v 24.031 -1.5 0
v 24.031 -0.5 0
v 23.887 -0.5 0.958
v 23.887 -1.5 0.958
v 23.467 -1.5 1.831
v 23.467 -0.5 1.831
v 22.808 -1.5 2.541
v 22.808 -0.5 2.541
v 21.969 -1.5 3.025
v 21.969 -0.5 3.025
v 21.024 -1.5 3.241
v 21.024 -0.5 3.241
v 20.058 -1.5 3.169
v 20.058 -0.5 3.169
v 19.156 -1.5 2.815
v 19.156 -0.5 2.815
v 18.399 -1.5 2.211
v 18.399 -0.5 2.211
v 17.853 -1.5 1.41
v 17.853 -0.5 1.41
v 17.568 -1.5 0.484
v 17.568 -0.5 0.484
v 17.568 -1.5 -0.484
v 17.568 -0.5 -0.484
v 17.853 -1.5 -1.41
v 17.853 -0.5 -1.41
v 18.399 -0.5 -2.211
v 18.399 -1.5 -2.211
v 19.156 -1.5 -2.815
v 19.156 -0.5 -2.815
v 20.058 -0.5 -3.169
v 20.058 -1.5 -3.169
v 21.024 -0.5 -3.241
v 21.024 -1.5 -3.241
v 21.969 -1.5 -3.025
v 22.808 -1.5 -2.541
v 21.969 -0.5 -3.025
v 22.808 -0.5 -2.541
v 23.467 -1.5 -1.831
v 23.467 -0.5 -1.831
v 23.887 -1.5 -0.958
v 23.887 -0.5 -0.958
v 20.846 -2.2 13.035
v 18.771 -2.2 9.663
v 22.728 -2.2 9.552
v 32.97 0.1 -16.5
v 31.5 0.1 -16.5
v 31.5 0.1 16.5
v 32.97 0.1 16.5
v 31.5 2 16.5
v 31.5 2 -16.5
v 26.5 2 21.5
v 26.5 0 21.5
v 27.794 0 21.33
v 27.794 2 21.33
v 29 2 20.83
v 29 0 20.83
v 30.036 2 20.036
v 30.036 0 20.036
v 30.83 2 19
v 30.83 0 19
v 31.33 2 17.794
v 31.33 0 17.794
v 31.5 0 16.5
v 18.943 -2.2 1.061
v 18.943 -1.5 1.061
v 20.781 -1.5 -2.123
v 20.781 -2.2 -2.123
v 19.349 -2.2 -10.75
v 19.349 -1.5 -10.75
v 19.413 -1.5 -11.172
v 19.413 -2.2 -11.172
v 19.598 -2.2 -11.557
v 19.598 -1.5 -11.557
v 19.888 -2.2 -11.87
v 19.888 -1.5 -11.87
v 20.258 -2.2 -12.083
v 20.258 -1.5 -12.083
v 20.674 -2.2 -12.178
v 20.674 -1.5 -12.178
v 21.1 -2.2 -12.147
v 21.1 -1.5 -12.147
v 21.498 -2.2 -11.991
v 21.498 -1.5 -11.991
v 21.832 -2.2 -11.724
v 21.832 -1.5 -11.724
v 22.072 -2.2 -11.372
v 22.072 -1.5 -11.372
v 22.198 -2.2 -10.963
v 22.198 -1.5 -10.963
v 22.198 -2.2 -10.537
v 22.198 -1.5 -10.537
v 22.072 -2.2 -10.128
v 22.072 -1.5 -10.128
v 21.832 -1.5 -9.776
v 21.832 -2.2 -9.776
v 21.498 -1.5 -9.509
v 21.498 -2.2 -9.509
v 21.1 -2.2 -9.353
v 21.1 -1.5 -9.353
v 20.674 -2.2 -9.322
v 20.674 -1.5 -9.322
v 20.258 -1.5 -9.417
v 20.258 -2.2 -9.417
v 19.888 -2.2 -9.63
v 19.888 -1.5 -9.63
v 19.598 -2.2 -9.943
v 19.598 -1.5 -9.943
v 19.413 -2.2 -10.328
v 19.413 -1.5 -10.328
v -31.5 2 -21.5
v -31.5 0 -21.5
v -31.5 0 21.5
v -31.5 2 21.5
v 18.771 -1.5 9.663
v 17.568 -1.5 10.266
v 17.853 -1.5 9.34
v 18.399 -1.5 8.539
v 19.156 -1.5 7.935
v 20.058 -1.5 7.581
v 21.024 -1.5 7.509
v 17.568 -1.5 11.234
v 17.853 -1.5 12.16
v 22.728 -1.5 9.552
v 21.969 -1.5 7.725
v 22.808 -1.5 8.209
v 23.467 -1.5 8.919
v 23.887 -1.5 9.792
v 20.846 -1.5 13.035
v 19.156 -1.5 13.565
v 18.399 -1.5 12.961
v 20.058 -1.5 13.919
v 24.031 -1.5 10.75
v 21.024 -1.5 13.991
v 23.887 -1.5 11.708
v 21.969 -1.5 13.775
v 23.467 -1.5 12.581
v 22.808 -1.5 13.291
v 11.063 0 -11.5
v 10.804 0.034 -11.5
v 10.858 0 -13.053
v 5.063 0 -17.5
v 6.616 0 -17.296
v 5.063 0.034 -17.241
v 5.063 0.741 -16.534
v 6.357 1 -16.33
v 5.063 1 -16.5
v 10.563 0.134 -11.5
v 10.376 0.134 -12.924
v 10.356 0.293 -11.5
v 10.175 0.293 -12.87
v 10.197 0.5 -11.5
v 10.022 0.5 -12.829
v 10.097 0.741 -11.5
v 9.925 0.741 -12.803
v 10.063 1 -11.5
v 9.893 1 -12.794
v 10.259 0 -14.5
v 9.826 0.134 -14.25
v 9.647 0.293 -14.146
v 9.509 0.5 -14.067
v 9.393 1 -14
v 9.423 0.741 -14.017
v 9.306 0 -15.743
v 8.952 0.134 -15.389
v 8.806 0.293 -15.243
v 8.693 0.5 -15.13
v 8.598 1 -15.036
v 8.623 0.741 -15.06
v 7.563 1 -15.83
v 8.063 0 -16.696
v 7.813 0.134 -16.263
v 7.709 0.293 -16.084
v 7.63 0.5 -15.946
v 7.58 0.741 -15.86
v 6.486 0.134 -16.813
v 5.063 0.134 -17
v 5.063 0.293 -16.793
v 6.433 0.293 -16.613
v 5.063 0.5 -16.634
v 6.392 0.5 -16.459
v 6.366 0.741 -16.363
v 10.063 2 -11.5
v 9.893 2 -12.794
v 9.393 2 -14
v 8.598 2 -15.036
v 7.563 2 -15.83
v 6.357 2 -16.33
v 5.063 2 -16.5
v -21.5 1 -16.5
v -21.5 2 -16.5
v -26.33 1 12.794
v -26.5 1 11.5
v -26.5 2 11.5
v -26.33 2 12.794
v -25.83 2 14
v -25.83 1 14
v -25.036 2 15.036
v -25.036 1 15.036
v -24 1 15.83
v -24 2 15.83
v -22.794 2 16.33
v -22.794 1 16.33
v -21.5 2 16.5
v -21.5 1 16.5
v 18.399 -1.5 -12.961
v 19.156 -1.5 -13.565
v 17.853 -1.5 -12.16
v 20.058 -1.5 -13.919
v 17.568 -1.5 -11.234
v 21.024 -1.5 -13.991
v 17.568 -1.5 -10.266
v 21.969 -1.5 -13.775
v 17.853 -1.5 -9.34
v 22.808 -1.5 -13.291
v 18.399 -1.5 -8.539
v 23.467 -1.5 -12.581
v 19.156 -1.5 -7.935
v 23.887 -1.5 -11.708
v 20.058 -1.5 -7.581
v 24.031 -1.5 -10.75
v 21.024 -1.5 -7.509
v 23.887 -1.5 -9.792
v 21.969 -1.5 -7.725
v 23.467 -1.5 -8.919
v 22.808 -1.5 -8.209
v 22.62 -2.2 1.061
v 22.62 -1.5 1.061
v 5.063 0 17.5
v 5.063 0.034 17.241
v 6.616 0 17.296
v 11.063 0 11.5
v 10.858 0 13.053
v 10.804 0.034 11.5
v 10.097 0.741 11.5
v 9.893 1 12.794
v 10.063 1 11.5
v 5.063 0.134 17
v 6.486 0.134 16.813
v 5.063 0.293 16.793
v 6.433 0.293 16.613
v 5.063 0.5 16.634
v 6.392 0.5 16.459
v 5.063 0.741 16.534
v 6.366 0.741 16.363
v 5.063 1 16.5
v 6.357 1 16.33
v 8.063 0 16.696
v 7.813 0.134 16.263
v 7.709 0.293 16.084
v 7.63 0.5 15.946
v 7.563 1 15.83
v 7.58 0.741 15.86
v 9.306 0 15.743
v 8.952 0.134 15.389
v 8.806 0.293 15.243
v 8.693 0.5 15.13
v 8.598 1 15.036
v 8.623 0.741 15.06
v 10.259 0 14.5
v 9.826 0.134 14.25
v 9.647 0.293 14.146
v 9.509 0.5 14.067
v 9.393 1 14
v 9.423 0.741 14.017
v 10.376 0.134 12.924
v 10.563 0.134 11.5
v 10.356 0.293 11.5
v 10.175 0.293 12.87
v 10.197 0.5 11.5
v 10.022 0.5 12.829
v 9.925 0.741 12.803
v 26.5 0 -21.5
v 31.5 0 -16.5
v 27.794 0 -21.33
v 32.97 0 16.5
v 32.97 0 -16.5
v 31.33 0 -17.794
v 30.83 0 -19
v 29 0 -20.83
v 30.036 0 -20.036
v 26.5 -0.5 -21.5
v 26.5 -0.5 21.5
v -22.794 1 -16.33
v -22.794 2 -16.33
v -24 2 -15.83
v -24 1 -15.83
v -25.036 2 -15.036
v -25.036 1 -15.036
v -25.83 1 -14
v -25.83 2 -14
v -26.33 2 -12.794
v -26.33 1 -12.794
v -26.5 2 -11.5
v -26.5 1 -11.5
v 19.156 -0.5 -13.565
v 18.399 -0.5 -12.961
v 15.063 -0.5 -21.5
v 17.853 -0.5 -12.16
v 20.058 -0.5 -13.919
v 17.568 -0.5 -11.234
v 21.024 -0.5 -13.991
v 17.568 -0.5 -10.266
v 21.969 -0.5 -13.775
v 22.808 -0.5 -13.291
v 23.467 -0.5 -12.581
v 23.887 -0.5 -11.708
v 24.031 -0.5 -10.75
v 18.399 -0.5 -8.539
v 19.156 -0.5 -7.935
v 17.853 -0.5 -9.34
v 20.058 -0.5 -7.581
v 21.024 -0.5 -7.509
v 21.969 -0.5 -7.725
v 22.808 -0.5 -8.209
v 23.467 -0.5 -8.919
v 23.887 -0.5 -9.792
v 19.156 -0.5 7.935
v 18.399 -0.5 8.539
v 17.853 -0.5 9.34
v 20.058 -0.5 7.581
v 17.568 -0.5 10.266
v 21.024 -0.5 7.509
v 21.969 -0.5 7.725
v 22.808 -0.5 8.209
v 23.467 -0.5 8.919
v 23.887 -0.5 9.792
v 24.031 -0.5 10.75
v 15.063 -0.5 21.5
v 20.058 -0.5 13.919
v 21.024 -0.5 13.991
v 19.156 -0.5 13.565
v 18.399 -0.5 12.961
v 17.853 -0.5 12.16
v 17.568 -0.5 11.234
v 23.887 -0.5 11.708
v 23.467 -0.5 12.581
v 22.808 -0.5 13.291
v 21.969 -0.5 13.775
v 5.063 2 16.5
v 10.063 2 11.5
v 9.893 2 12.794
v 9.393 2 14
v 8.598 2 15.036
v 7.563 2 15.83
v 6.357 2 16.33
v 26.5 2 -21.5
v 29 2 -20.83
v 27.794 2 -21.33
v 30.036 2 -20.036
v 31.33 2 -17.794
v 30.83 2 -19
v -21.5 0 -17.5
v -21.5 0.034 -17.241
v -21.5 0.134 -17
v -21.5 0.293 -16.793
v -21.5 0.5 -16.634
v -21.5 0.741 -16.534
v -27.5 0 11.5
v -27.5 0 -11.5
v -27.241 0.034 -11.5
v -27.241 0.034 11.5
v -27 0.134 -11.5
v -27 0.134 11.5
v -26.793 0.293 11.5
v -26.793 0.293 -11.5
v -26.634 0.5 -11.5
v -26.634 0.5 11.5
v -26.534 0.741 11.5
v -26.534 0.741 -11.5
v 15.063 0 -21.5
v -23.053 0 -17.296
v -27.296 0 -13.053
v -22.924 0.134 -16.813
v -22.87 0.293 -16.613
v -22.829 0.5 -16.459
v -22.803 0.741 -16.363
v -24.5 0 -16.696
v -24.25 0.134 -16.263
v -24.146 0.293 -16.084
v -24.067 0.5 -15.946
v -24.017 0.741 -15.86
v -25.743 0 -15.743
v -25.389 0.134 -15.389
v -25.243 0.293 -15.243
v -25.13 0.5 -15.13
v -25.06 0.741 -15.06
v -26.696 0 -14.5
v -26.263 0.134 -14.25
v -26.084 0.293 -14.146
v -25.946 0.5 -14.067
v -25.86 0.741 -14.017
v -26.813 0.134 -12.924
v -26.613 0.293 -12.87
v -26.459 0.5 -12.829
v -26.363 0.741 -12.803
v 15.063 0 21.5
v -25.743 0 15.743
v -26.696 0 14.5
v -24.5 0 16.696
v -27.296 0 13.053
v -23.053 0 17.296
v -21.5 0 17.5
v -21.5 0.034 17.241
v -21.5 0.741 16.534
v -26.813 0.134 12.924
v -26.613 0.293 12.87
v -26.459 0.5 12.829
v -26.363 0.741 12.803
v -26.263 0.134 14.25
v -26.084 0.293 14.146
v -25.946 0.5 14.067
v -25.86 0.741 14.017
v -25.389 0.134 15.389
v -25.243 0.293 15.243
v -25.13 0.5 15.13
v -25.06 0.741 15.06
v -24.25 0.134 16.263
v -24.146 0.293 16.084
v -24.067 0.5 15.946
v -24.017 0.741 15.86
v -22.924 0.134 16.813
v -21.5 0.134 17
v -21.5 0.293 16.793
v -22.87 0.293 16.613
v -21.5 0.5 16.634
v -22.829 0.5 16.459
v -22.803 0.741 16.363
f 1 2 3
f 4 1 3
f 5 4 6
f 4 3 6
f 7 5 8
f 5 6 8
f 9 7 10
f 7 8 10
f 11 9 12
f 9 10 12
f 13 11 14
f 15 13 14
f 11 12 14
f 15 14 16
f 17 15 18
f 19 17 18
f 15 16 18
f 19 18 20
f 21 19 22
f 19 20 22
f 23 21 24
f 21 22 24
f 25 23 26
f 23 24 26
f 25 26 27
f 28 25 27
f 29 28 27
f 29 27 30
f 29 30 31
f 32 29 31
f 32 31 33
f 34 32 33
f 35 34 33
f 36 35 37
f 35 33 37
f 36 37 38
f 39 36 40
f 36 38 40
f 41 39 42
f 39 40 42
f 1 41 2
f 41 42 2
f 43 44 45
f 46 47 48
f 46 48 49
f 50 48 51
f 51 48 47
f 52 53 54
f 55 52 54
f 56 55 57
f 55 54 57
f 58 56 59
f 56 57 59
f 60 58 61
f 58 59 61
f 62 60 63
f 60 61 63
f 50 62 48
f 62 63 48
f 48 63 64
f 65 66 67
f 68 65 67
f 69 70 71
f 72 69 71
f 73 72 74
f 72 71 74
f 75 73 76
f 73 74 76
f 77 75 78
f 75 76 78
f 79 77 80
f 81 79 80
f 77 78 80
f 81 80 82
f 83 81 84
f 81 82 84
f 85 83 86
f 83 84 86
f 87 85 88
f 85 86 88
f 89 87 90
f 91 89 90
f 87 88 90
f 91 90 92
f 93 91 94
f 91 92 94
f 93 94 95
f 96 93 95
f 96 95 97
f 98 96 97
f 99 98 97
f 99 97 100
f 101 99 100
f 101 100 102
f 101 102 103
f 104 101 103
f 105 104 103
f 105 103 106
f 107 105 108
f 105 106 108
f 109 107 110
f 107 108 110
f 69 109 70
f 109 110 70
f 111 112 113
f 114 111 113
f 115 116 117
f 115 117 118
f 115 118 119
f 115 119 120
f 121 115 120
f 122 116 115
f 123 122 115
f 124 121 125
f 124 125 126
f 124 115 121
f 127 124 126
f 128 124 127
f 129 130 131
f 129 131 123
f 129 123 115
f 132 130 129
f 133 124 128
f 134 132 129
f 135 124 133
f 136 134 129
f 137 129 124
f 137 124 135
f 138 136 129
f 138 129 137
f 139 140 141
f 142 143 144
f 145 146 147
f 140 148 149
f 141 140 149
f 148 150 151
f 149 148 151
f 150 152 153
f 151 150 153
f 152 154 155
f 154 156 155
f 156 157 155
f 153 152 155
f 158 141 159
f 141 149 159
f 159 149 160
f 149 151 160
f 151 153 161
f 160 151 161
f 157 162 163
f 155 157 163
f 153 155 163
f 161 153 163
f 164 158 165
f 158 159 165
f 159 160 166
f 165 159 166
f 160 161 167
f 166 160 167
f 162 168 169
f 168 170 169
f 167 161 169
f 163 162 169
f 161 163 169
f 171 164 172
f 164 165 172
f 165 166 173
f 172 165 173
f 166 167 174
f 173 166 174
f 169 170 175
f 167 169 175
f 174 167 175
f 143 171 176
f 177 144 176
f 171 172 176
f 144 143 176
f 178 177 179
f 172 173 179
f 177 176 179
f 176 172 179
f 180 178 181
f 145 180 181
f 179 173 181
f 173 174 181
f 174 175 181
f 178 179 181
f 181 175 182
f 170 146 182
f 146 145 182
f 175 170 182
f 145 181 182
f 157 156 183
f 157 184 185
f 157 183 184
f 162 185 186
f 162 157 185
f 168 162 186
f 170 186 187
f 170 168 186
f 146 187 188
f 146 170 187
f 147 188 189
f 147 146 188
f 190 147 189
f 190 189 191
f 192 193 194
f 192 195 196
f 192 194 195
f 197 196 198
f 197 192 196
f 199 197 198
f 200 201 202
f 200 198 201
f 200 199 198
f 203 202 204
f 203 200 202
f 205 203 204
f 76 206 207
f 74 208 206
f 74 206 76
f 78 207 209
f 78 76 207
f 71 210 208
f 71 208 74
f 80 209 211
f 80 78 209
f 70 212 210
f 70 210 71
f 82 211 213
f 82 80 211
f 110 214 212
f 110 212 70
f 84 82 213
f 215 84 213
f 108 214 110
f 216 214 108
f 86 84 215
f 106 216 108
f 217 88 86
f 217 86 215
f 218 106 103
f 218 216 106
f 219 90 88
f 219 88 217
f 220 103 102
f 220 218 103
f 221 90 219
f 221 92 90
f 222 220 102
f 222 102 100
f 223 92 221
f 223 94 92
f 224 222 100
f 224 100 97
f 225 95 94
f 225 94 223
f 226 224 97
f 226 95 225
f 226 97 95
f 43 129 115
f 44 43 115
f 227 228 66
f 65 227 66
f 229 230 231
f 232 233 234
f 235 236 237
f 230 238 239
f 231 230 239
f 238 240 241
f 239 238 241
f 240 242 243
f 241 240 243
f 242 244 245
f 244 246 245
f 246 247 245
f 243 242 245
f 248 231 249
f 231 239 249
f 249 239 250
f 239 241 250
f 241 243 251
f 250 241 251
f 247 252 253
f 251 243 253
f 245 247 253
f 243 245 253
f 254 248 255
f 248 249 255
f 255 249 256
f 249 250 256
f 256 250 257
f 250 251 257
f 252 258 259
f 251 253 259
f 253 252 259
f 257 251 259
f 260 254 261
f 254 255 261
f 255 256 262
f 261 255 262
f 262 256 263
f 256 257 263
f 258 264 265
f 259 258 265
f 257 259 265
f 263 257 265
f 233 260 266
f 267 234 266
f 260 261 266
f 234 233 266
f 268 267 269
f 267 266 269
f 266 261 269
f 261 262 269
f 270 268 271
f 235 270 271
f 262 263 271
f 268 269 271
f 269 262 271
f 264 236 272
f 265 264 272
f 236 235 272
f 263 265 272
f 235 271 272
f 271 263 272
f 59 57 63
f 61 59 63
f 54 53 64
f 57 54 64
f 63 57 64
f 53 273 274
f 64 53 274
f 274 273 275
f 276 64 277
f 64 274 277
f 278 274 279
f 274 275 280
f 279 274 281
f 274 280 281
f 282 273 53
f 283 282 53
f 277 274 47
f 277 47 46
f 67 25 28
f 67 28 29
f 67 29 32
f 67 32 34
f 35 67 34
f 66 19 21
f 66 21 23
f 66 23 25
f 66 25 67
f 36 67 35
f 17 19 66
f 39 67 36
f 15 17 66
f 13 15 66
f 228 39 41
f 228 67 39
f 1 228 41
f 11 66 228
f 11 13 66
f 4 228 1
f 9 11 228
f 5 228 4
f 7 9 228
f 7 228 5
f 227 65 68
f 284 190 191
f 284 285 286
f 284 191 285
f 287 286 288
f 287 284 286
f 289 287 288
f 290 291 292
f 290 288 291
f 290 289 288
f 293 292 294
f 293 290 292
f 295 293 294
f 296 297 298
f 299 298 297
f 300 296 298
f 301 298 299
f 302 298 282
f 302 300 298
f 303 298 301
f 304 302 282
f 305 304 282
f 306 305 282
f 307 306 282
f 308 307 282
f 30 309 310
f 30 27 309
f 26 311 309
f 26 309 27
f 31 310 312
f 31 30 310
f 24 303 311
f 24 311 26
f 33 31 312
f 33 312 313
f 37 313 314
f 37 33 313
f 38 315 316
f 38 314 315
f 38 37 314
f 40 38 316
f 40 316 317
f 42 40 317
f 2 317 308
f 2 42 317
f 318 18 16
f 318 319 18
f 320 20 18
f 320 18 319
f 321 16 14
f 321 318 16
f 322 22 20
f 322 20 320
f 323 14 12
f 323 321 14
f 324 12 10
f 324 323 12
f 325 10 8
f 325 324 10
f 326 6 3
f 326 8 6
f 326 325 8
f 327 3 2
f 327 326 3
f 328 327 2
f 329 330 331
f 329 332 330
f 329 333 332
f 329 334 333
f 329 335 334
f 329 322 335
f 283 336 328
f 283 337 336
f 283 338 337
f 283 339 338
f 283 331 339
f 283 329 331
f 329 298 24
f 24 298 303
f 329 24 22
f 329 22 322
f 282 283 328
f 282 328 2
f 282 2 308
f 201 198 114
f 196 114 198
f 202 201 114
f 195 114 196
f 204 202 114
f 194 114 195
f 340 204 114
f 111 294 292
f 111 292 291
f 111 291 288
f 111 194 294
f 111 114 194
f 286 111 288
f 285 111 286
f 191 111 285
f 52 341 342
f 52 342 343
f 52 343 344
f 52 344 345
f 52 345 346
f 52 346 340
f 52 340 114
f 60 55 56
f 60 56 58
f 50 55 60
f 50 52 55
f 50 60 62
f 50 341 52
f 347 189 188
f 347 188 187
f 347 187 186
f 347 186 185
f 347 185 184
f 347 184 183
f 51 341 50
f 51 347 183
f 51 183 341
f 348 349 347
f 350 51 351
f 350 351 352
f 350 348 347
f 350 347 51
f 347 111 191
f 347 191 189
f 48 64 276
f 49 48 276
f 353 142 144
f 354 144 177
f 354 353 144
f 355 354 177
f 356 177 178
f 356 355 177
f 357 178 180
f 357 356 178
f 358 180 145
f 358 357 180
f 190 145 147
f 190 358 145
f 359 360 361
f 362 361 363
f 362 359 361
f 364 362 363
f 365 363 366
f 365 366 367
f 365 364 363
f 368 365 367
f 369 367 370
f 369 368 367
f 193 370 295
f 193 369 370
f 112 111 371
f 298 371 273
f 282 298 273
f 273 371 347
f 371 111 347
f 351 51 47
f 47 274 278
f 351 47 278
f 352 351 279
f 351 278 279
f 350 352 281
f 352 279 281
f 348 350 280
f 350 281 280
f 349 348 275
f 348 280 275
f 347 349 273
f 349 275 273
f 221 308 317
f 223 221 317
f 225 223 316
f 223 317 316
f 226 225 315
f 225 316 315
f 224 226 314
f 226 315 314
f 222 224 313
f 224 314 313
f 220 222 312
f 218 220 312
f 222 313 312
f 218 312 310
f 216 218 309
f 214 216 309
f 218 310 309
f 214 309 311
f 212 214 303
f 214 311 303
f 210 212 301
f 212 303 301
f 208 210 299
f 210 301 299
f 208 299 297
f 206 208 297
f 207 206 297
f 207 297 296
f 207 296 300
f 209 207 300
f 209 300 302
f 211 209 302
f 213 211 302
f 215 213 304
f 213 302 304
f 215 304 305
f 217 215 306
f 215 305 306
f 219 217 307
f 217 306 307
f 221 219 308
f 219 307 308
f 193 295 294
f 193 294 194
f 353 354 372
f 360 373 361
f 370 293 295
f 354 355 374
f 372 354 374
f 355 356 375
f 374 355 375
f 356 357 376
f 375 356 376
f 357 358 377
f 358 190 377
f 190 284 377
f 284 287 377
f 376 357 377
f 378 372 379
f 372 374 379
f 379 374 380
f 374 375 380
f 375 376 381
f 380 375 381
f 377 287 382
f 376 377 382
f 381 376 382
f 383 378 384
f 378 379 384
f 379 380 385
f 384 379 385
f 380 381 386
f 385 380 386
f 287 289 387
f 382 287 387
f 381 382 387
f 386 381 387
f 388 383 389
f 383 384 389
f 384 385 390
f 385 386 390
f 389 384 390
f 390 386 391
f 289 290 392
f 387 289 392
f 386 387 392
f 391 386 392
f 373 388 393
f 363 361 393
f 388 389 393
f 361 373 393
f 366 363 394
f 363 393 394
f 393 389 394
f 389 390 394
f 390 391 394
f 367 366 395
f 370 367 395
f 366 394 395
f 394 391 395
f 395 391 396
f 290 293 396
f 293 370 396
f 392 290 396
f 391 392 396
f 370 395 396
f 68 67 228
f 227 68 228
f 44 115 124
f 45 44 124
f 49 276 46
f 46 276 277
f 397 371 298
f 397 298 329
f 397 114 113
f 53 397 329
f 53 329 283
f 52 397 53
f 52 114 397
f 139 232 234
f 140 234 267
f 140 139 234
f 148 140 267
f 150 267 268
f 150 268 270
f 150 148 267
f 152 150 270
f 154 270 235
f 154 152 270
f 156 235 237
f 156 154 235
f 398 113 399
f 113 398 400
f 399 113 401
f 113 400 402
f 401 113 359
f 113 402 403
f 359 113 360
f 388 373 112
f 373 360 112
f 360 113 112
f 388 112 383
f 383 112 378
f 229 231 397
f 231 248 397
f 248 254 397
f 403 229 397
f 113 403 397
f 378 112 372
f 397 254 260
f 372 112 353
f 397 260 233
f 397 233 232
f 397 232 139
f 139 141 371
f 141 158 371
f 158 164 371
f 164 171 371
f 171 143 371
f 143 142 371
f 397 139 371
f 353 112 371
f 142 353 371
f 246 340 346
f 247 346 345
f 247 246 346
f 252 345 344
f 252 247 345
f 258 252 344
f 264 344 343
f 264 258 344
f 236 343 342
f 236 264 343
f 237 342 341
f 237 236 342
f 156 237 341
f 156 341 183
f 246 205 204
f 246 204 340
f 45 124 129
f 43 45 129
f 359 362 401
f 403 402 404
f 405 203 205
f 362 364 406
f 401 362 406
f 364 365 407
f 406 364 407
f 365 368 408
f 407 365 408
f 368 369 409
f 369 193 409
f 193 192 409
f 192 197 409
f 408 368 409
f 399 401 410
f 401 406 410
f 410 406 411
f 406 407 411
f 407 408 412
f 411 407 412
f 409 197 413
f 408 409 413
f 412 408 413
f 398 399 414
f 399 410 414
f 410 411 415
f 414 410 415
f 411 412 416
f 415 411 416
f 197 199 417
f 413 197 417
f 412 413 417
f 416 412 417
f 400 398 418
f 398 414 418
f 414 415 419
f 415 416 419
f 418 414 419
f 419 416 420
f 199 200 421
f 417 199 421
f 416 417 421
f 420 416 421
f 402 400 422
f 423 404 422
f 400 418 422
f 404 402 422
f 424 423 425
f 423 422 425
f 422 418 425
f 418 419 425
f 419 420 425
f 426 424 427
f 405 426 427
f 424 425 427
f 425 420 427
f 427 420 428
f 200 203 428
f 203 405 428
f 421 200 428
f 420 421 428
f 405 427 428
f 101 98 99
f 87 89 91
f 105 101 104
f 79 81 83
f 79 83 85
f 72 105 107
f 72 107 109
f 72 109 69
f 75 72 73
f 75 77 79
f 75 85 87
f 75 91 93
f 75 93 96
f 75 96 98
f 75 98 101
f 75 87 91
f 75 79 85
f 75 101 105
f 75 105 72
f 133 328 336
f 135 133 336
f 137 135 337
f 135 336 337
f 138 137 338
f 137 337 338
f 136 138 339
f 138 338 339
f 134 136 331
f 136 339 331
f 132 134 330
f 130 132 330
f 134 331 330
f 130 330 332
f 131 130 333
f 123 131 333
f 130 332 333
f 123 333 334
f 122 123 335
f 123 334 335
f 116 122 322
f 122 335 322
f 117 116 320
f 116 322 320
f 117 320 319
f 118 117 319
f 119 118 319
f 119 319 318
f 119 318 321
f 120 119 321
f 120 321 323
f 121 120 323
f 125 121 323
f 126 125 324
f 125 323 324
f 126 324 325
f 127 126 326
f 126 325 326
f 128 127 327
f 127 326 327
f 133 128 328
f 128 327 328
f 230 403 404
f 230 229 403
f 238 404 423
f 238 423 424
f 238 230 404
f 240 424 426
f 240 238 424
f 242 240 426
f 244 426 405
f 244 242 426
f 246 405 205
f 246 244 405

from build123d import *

# Parameters (mm, degrees)
BOSS_EXTRUDE1_DEPTH = 2
SKETCH3_W           = 1.47
SKETCH3_H           = 33
BOSS_EXTRUDE3_DEPTH = 0.1
SKETCH4_W           = 11.437084048
SKETCH4_H           = 43
BOSS_EXTRUDE4_DEPTH = 0.5
SKETCH5_R           = 3.25
BOSS_EXTRUDE5_DEPTH = 1
BOSS_EXTRUDE6_DEPTH = 0.7
CUT_EXTRUDE2_DEPTH  = 10
FILLET4_R           = 1
SKETCH7_R           = 1.432474787
BOSS_EXTRUDE7_DEPTH = 0.7


with BuildPart() as part:
    # Sketch1 → Boss-Extrude1 (new body)
    with BuildSketch(Plane(origin=(0, 0, 0), x_dir=(1, 0, 0), z_dir=(0, 1, 0))):
        with BuildLine():
            Line((-26.5, 21.5), (-31.5, 21.5))
            Line((-31.5, 21.5), (-31.5, 16.5))
            Line((-31.5, 16.5), (-31.5, -16.5))
            Line((-31.5, -16.5), (-31.5, -21.5))
            Line((-31.5, -21.5), (-26.5, -21.5))
            Line((-26.5, -21.5), (26.5, -21.5))
            ThreePointArc((26.5, -21.5), (30.035533906, -20.035533906), (31.5, -16.5))
            Line((31.5, -16.5), (31.5, 16.5))
            ThreePointArc((31.5, 16.5), (30.035533906, 20.035533906), (26.5, 21.5))
            Line((26.5, 21.5), (-26.5, 21.5))
        make_face()
    extrude(amount=BOSS_EXTRUDE1_DEPTH)

    # Sketch3 → Boss-Extrude3 (add)
    with BuildSketch(Plane(origin=(0, 0, 0), x_dir=(1, 0, 0), z_dir=(0, 1, 0))):
        with Locations((32.235, 0)):
            Rectangle(SKETCH3_W, SKETCH3_H)
    extrude(amount=BOSS_EXTRUDE3_DEPTH)

    # Sketch4 → Boss-Extrude4 (add)
    with BuildSketch(Plane.XZ):
        with Locations((20.781457976, 0)):
            Rectangle(SKETCH4_W, SKETCH4_H)
    extrude(amount=BOSS_EXTRUDE4_DEPTH)

    # Sketch5 → Boss-Extrude5 (add)
    with BuildSketch(Plane.XZ.offset(0.5)):
        with Locations((20.781457976, -10.75)):
            Circle(SKETCH5_R)
        with Locations((20.781457976, 0)):
            Circle(SKETCH5_R)
        with Locations((20.781457976, 10.75)):
            Circle(SKETCH5_R)
    extrude(amount=BOSS_EXTRUDE5_DEPTH)

    # Sketch6 → Boss-Extrude6 (add)
    with BuildSketch(Plane.XZ.offset(1.5)):
        Polygon((22.728056174, 9.551943968), (20.845705836, 13.034831506), (18.770611919, 9.663224526), align=None)
        Polygon((20.781457976, -2.122654215), (22.61973045, 1.061327108), (18.943185502, 1.061327108), align=None)
    extrude(amount=BOSS_EXTRUDE6_DEPTH)

    # Sketch9 → Cut-Extrude2 (cut)
    with BuildSketch(Plane(origin=(0, 0, 0), x_dir=(-1, 0, 0), z_dir=(0, -1, 0))):
        with BuildLine():
            Line((-5.062915952, 16.5), (21.5, 16.5))
            ThreePointArc((21.5, 16.5), (25.035533906, 15.035533906), (26.5, 11.5))
            Line((26.5, 11.5), (26.5, -11.5))
            ThreePointArc((26.5, -11.5), (25.035533906, -15.035533906), (21.5, -16.5))
            Line((21.5, -16.5), (-5.062915952, -16.5))
            ThreePointArc((-5.062915952, -16.5), (-8.598449858, -15.035533906), (-10.062915952, -11.5))
            Line((-10.062915952, -11.5), (-10.062915952, 11.5))
            ThreePointArc((-10.062915952, 11.5), (-8.598449858, 15.035533906), (-5.062915952, 16.5))
        make_face()
    extrude(amount=-CUT_EXTRUDE2_DEPTH, mode=Mode.SUBTRACT)

    # Fillet4
    fillet4_edges = [part.edges().sort_by_distance(p)[0] for p in [
        (8.598449858, 0, 15.035533906),
        (-8.218542024, 0, 16.5),
        (-25.035533906, 0, 15.035533906),
        (-26.5, 0, 0),
        (-25.035533906, 0, -15.035533906),
        (-8.218542024, 0, -16.5),
        (8.598449858, 0, -15.035533906),
        (10.062915952, 0, 0),
    ]]
    fillet(fillet4_edges, radius=FILLET4_R)

    # Sketch7 → Boss-Extrude7 (add)
    with BuildSketch(Plane(origin=(0, -1.5, 0), x_dir=(-1, 0, 0), z_dir=(0, -1, 0))):
        with Locations((-20.781457976, 10.75)):
            Circle(SKETCH7_R)
    extrude(amount=BOSS_EXTRUDE7_DEPTH)


solid = part.part
